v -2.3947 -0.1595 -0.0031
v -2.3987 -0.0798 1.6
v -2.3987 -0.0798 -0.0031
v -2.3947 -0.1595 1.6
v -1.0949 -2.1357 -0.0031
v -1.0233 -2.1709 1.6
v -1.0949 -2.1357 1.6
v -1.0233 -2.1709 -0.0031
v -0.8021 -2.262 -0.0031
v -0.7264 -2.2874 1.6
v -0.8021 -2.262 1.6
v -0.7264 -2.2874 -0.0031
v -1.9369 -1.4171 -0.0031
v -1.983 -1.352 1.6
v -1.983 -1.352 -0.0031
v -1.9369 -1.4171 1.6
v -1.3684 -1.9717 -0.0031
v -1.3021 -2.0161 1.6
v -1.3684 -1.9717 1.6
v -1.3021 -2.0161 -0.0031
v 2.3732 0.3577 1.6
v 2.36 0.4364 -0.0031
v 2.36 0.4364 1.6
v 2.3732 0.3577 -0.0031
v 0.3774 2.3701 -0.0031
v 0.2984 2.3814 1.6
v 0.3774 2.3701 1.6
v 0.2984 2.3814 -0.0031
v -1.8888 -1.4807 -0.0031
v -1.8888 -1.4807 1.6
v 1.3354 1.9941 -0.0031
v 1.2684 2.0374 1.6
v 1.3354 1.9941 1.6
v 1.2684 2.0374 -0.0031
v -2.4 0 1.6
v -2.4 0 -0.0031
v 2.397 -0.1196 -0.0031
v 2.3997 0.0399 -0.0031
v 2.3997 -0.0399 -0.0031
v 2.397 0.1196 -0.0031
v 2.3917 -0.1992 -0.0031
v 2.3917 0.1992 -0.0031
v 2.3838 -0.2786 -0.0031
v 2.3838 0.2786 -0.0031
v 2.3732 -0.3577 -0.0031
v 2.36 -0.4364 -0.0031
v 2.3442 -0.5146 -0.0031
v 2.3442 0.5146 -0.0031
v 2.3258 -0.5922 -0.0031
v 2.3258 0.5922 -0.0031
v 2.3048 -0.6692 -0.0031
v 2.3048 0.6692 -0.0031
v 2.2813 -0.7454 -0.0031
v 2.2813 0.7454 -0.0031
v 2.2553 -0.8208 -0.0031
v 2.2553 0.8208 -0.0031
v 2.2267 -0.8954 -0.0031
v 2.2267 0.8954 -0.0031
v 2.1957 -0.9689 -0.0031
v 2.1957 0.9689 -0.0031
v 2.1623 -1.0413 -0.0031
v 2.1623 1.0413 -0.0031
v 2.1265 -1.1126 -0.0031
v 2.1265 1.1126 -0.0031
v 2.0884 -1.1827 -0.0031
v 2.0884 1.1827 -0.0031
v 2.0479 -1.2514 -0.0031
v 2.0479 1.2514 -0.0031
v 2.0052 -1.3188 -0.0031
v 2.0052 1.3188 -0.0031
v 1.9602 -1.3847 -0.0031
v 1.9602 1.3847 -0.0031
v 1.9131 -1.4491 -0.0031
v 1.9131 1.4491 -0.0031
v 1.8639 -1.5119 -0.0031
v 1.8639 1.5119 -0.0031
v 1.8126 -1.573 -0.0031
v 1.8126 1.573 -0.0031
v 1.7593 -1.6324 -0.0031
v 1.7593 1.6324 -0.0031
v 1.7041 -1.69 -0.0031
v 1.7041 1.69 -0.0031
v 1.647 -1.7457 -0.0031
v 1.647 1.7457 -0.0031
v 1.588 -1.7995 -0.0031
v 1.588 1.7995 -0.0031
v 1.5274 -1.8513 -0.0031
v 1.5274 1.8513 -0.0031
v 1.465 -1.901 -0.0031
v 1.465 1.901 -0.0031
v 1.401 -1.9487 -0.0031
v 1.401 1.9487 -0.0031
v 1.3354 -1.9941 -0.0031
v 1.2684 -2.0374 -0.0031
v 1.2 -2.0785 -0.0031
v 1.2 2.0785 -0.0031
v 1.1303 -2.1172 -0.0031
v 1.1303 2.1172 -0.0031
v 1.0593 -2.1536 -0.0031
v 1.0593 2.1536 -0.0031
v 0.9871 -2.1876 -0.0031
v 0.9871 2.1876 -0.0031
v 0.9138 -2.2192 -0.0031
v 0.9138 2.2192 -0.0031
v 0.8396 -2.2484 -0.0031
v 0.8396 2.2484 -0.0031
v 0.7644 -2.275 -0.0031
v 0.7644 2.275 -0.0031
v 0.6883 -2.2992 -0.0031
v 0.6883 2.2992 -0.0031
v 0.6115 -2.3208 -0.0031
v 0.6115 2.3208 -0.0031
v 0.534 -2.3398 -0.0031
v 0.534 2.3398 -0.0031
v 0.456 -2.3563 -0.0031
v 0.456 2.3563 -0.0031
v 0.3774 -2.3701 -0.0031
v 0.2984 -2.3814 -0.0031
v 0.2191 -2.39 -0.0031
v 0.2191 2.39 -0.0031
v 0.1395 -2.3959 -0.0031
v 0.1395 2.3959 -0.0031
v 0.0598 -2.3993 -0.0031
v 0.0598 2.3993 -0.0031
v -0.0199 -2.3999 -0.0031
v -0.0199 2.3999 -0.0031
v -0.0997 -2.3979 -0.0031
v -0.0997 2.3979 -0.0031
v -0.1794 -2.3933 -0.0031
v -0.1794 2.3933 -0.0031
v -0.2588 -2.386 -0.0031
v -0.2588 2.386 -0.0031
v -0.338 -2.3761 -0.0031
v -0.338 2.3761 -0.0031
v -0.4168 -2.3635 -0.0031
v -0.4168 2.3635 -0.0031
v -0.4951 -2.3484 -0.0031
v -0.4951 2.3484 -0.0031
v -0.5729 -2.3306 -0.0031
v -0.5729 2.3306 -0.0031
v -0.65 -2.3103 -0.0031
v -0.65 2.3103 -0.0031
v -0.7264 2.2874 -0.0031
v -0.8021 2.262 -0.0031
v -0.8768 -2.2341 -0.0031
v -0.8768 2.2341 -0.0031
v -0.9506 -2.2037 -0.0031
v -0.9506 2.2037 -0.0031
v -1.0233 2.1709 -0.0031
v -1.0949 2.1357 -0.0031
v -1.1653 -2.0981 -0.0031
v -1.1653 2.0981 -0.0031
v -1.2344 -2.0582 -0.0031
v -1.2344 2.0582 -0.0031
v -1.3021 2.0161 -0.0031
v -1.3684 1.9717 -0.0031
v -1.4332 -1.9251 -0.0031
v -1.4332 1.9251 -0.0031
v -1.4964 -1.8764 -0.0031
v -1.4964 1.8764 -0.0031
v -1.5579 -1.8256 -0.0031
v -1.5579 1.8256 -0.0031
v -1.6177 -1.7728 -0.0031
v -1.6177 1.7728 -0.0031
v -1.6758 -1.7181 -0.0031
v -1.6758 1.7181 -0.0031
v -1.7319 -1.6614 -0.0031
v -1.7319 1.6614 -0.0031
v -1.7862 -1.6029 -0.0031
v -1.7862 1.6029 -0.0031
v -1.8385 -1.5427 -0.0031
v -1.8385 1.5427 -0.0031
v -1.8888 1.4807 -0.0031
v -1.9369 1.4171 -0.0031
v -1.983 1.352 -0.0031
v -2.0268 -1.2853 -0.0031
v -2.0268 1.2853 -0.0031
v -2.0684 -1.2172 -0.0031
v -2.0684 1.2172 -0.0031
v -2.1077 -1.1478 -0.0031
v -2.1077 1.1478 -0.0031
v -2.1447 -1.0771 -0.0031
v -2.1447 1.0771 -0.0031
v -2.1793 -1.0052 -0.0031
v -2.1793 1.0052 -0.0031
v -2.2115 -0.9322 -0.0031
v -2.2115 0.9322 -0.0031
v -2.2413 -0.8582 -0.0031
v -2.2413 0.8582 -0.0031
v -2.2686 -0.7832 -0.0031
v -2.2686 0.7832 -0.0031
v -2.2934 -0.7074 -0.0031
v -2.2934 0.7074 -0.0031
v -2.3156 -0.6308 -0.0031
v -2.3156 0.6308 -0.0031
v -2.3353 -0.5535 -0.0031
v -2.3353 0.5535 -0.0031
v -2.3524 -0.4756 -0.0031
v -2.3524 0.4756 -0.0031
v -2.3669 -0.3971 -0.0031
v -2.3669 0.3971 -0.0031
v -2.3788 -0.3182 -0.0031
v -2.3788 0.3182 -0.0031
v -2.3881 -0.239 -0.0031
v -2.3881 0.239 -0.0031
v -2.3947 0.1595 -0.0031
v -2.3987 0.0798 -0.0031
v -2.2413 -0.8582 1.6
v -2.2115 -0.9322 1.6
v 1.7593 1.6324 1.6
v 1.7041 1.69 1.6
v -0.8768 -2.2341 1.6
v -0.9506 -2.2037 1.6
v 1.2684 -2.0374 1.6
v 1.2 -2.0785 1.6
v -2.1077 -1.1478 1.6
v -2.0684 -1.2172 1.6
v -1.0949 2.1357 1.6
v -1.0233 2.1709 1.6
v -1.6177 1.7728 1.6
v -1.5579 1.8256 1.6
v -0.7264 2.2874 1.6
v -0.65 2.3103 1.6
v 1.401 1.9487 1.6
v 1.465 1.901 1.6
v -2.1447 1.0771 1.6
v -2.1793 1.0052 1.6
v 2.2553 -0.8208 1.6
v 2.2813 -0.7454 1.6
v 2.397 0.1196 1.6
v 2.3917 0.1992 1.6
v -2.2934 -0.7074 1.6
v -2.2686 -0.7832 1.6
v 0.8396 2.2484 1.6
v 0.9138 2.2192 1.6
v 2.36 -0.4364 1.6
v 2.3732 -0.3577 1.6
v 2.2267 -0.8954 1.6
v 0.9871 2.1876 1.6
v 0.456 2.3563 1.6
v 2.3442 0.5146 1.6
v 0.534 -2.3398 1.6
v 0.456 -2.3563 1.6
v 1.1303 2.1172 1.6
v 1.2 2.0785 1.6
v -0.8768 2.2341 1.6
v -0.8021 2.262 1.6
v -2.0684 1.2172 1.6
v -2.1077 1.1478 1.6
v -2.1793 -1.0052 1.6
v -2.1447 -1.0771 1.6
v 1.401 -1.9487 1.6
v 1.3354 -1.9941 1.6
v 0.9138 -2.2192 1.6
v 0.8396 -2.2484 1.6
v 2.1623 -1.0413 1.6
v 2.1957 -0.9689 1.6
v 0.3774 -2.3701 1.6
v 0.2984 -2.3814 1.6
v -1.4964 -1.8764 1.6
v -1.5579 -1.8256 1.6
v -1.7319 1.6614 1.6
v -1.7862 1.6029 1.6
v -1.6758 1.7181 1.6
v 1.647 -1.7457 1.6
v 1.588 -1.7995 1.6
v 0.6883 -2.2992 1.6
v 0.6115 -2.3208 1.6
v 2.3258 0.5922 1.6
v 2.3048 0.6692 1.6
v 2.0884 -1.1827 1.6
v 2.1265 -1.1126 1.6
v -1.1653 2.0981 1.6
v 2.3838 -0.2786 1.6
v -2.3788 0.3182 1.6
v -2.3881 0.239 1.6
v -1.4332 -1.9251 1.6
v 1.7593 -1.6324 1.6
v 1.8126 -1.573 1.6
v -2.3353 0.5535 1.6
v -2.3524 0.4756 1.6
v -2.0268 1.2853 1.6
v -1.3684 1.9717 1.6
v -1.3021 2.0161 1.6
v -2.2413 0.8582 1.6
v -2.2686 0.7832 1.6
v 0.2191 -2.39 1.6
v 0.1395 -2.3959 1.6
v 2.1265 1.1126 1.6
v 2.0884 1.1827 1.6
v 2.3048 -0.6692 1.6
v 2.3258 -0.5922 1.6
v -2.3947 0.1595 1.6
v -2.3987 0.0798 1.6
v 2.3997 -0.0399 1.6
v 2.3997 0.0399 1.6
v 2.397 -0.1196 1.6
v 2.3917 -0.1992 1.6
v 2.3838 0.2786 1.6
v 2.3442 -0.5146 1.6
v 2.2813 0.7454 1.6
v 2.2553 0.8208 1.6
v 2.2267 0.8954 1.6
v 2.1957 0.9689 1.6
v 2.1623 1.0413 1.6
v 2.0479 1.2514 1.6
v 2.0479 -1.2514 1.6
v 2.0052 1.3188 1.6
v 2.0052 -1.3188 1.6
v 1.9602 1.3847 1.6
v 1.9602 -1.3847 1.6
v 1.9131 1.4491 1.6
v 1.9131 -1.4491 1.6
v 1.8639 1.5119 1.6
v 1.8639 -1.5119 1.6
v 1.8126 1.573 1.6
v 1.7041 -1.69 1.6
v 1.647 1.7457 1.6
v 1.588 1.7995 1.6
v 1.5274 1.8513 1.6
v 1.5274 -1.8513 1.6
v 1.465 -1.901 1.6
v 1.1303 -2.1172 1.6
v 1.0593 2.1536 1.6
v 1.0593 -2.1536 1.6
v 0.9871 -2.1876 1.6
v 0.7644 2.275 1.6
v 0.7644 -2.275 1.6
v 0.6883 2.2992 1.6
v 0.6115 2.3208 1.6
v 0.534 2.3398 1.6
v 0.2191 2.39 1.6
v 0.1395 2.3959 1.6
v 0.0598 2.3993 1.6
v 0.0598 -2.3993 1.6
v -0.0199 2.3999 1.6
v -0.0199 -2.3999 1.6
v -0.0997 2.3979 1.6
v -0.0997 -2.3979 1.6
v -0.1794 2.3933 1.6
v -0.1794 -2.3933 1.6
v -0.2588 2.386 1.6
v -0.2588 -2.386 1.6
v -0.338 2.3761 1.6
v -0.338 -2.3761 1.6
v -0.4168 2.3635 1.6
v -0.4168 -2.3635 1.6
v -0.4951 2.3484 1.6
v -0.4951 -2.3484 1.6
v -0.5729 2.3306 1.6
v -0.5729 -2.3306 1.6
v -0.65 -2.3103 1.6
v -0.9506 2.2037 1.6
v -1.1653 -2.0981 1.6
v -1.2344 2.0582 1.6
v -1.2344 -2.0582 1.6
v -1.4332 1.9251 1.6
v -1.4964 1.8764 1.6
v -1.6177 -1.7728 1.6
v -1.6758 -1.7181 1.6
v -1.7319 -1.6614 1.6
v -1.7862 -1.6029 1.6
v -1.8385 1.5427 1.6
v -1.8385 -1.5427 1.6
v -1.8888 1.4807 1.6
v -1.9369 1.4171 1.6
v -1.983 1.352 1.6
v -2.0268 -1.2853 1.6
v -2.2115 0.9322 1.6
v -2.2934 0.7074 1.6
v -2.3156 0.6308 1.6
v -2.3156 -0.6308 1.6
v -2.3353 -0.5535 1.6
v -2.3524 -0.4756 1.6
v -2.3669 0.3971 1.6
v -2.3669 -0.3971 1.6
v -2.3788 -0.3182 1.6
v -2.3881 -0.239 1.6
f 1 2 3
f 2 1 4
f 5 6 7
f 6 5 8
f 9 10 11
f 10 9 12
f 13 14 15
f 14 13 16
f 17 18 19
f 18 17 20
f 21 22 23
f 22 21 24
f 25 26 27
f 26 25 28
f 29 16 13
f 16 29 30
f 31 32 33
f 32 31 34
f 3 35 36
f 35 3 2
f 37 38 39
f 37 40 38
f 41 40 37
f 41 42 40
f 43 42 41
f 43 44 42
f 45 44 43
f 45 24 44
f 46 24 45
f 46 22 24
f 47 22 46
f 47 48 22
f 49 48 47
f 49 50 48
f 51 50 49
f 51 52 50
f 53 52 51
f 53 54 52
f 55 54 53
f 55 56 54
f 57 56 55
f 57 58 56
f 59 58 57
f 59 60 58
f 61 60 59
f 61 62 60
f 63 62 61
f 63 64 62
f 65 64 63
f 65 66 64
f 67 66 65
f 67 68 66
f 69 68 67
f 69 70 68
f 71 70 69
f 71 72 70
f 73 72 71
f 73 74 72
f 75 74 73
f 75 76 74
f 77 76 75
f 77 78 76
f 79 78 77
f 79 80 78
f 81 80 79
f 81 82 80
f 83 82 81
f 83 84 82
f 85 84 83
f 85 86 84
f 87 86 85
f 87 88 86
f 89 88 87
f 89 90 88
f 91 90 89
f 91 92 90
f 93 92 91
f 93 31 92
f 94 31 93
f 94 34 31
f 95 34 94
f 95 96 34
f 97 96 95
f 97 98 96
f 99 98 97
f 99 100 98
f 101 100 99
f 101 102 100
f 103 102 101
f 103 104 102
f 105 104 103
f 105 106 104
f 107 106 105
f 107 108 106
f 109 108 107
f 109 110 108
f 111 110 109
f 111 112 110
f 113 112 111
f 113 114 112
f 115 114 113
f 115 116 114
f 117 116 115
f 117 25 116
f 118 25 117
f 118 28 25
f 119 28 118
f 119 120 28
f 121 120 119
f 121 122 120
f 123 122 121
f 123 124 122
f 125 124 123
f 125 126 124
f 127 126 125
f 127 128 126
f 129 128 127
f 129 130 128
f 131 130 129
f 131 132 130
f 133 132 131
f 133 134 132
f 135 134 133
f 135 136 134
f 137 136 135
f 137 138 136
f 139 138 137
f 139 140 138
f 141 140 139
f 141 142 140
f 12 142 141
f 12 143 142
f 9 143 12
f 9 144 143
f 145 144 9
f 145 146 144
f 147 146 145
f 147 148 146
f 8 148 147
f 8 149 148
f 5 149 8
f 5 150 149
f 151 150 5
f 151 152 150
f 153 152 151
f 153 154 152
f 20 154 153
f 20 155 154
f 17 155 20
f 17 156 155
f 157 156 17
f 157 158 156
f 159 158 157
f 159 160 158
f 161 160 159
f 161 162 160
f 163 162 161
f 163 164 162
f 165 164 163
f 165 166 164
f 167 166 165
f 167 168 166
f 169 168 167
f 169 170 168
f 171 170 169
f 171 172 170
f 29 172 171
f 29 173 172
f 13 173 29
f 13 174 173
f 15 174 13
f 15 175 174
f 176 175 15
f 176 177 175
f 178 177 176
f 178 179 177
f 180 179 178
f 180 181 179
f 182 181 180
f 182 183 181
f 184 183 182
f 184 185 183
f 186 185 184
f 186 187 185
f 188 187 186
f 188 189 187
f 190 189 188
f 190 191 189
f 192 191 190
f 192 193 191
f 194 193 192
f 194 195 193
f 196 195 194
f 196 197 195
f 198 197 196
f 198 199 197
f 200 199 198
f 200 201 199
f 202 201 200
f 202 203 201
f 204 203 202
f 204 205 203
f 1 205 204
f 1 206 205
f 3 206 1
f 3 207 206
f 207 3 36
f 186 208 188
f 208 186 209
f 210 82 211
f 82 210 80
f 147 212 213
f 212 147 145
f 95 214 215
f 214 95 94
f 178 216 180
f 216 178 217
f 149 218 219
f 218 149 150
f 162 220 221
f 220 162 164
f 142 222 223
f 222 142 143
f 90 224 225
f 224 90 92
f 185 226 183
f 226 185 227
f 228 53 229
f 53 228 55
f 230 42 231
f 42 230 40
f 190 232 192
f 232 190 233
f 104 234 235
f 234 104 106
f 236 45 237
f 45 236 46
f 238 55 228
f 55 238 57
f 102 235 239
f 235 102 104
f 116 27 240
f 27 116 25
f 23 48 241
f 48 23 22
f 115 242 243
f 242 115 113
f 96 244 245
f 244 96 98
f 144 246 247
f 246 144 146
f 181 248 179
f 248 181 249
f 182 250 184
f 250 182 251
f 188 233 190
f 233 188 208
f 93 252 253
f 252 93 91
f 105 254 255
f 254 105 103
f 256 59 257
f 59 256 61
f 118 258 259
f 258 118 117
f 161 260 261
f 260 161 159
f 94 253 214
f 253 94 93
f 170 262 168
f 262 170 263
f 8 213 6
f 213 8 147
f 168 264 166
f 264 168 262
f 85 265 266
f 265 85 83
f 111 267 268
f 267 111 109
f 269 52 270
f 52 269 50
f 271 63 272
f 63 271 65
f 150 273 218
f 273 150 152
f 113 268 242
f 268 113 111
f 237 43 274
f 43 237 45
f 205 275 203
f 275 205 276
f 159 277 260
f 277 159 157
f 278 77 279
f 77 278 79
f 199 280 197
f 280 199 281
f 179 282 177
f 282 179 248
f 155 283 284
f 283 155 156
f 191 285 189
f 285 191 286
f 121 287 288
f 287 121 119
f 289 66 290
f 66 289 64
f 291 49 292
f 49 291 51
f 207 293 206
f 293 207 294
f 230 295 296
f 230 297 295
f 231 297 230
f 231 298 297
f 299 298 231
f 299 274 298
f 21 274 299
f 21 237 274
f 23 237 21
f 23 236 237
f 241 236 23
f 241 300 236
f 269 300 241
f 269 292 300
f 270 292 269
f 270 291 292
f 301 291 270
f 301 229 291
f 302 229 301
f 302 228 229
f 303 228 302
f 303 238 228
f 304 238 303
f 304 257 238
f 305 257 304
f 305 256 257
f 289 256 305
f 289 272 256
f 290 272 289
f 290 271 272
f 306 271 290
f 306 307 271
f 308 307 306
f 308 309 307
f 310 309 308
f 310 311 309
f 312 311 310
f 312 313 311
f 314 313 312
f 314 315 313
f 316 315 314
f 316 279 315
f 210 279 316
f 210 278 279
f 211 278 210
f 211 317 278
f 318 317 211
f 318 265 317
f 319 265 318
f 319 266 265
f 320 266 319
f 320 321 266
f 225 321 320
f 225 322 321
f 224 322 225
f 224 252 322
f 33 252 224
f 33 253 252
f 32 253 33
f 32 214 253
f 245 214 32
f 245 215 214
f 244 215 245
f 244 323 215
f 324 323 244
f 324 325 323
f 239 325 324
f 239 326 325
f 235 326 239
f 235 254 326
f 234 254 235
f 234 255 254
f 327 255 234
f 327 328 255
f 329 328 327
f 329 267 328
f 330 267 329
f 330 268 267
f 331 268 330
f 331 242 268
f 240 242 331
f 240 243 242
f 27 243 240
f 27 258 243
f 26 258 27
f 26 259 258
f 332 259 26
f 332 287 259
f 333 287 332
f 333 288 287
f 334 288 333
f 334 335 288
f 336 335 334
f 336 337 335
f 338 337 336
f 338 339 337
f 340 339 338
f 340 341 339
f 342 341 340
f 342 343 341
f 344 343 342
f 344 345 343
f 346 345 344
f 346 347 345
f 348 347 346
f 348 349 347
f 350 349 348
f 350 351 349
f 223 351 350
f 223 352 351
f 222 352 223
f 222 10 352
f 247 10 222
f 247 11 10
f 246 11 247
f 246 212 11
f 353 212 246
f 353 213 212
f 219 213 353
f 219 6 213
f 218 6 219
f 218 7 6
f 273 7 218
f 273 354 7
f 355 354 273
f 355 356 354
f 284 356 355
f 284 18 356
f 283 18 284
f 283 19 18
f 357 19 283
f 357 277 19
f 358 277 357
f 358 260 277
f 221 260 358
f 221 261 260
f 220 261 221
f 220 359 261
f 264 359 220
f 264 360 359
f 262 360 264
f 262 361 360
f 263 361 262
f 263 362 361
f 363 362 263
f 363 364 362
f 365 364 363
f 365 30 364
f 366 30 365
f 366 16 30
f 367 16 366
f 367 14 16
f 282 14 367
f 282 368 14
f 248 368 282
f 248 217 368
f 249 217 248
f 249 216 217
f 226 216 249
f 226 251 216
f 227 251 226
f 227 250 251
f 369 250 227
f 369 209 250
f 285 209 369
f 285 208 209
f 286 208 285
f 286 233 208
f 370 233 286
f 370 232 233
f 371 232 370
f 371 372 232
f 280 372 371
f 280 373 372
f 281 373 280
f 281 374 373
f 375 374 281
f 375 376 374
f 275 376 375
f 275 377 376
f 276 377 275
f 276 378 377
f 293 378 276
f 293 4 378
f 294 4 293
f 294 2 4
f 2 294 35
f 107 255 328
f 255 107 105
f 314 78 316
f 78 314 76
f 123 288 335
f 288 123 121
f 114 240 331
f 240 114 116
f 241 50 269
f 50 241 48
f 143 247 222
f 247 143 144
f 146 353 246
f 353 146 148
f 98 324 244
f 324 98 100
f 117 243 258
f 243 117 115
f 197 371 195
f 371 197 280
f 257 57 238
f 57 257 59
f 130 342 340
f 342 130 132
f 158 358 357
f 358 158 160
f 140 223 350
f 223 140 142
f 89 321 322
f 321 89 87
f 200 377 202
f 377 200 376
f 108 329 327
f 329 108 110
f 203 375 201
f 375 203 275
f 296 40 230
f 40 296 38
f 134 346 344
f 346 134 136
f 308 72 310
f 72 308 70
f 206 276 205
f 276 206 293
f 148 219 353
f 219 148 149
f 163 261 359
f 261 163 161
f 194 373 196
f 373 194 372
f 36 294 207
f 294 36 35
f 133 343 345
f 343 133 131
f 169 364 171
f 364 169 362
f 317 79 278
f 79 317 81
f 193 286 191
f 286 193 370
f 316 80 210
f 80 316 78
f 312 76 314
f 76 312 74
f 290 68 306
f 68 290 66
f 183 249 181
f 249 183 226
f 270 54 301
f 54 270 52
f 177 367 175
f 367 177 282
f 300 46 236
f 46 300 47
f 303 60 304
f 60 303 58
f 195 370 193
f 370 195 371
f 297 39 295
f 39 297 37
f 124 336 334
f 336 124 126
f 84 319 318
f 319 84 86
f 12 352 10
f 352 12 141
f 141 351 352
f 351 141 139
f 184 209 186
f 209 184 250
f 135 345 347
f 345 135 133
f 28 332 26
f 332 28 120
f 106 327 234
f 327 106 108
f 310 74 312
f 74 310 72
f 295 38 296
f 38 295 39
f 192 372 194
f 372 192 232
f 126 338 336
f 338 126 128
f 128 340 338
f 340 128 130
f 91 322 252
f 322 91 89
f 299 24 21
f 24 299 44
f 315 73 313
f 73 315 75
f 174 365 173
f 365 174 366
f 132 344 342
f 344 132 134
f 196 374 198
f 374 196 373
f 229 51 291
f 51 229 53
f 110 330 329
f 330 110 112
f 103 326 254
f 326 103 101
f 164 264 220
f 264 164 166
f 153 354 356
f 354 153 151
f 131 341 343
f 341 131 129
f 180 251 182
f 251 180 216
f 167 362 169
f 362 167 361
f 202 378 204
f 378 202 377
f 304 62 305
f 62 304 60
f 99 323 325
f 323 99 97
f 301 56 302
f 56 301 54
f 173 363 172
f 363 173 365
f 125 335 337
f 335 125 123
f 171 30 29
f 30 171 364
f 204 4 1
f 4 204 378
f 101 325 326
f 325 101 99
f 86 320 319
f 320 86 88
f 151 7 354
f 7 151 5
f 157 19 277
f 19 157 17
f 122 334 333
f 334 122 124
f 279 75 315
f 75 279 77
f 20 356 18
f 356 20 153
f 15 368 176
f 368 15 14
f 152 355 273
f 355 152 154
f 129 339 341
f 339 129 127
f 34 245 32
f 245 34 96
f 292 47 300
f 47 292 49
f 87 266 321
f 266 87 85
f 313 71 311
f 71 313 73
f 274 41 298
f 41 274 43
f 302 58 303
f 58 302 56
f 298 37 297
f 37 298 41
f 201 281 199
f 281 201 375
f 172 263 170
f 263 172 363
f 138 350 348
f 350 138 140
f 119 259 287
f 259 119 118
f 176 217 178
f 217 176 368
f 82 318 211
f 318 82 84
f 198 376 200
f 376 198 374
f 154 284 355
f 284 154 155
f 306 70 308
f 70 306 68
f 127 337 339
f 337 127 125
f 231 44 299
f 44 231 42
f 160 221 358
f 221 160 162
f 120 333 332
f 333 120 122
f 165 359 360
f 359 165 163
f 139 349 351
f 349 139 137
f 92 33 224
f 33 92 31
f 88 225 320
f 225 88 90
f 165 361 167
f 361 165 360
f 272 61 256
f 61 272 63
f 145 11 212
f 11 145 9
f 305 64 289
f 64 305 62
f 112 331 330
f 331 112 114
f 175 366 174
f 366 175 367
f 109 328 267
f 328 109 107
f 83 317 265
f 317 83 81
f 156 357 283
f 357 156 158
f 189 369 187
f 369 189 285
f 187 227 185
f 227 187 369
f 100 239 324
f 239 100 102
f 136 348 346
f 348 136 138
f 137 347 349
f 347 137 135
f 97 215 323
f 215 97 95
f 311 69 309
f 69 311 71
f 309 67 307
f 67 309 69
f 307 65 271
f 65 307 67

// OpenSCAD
// file: ../p/4-4edge.scad
use <../lib.scad>
$fa=1; $fs=0.2;
function ldraw_lib__4_4edge(realsolid=false) = [
// 0 Circle 1.0
// 0 Name: 4-4edge.dat
// 0 Author: James Jessiman
// 0 !LDRAW_ORG Primitive UPDATE 2017-01
// 0 !LICENSE Licensed under CC BY 2.0 and CC BY 4.0 : see CAreadme.txt
// 
// 0 BFC CERTIFY CCW
  [0,"BFC","CERTIFY"],
  [0,"BFC","CCW"],
// 
// 0 !HISTORY 1998-12-15 [PTadmin] Official Update 1998-10
// 0 !HISTORY 2005-12-28 [PTadmin] Official Update 2005-01
// 0 !HISTORY 2007-06-24 [PTadmin] Header formatted for Contributor Agreement
// 0 !HISTORY 2008-07-01 [PTadmin] Official Update 2008-01
// 0 !HISTORY 2017-01-15 [Steffen] BFCed
// 0 !HISTORY 2017-12-30 [PTadmin] Official Update 2017-01
// 
// 
// 2 24 1 0 0 0.9239 0 0.3827
  [2,24,1,0,0,0.9239,0,0.3827],
// 2 24 0.9239 0 0.3827 0.7071 0 0.7071
  [2,24,0.9239,0,0.3827,0.7071,0,0.7071],
// 2 24 0.7071 0 0.7071 0.3827 0 0.9239
  [2,24,0.7071,0,0.7071,0.3827,0,0.9239],
// 2 24 0.3827 0 0.9239 0 0 1
  [2,24,0.3827,0,0.9239,0,0,1],
// 2 24 0 0 1 -0.3827 0 0.9239
  [2,24,0,0,1,-0.3827,0,0.9239],
// 2 24 -0.3827 0 0.9239 -0.7071 0 0.7071
  [2,24,-0.3827,0,0.9239,-0.7071,0,0.7071],
// 2 24 -0.7071 0 0.7071 -0.9239 0 0.3827
  [2,24,-0.7071,0,0.7071,-0.9239,0,0.3827],
// 2 24 -0.9239 0 0.3827 -1 0 -0
  [2,24,-0.9239,0,0.3827,-1,0,-0],
// 2 24 -1 0 -0 -0.9239 0 -0.3827
  [2,24,-1,0,-0,-0.9239,0,-0.3827],
// 2 24 -0.9239 0 -0.3827 -0.7071 0 -0.7071
  [2,24,-0.9239,0,-0.3827,-0.7071,0,-0.7071],
// 2 24 -0.7071 0 -0.7071 -0.3827 0 -0.9239
  [2,24,-0.7071,0,-0.7071,-0.3827,0,-0.9239],
// 2 24 -0.3827 0 -0.9239 0 0 -1
  [2,24,-0.3827,0,-0.9239,0,0,-1],
// 2 24 0 0 -1 0.3827 0 -0.9239
  [2,24,0,0,-1,0.3827,0,-0.9239],
// 2 24 0.3827 0 -0.9239 0.7071 0 -0.7071
  [2,24,0.3827,0,-0.9239,0.7071,0,-0.7071],
// 2 24 0.7071 0 -0.7071 0.9239 0 -0.3827
  [2,24,0.7071,0,-0.7071,0.9239,0,-0.3827],
// 2 24 0.9239 0 -0.3827 1 0 0
  [2,24,0.9239,0,-0.3827,1,0,0],
];
module ldraw_lib__4_4edge(step=0, col=false, unit=2/5, alt=false, line=0.2, solid=!$preview)
    makepoly(ldraw_lib__4_4edge(solid), step=step, col=col, unit=unit, alt=alt, line=line, solid=solid);
ldraw_lib__4_4edge(line=0.2);
// file: ../p/4-4disc.scad
use <../lib.scad>
$fa=1; $fs=0.2;
function ldraw_lib__4_4disc(realsolid=false) = [
// 0 Disc 1.0
// 0 Name: 4-4disc.dat
// 0 Author: James Jessiman
// 0 !LDRAW_ORG Primitive UPDATE 2002-02
// 0 !LICENSE Licensed under CC BY 2.0 and CC BY 4.0 : see CAreadme.txt
// 
// 0 BFC CERTIFY CCW
  [0,"BFC","CERTIFY"],
  [0,"BFC","CCW"],
// 
// 0 !HISTORY 1998-12-15 [PTadmin] Official Update 1998-10
// 0 !HISTORY 2002-03-23 [sbliss] Added BFC statement
// 0 !HISTORY 2002-04-25 [PTadmin] Official Update 2002-02
// 0 !HISTORY 2007-06-24 [PTadmin] Header formatted for Contributor Agreement
// 0 !HISTORY 2008-07-01 [PTadmin] Official Update 2008-01
// 
// 
// 3 16 0 0 0 1 0 0 0.9239 0 0.3827
  [3,16,0,0,0,1,0,0,0.9239,0,0.3827],
// 3 16 0 0 0 0.9239 0 0.3827 0.7071 0 0.7071
  [3,16,0,0,0,0.9239,0,0.3827,0.7071,0,0.7071],
// 3 16 0 0 0 0.7071 0 0.7071 0.3827 0 0.9239
  [3,16,0,0,0,0.7071,0,0.7071,0.3827,0,0.9239],
// 3 16 0 0 0 0.3827 0 0.9239 0 0 1
  [3,16,0,0,0,0.3827,0,0.9239,0,0,1],
// 3 16 0 0 0 0 0 1 -0.3827 0 0.9239
  [3,16,0,0,0,0,0,1,-0.3827,0,0.9239],
// 3 16 0 0 0 -0.3827 0 0.9239 -0.7071 0 0.7071
  [3,16,0,0,0,-0.3827,0,0.9239,-0.7071,0,0.7071],
// 3 16 0 0 0 -0.7071 0 0.7071 -0.9239 0 0.3827
  [3,16,0,0,0,-0.7071,0,0.7071,-0.9239,0,0.3827],
// 3 16 0 0 0 -0.9239 0 0.3827 -1 0 -0
  [3,16,0,0,0,-0.9239,0,0.3827,-1,0,-0],
// 3 16 0 0 0 -1 0 -0 -0.9239 0 -0.3827
  [3,16,0,0,0,-1,0,-0,-0.9239,0,-0.3827],
// 3 16 0 0 0 -0.9239 0 -0.3827 -0.7071 0 -0.7071
  [3,16,0,0,0,-0.9239,0,-0.3827,-0.7071,0,-0.7071],
// 3 16 0 0 0 -0.7071 0 -0.7071 -0.3827 0 -0.9239
  [3,16,0,0,0,-0.7071,0,-0.7071,-0.3827,0,-0.9239],
// 3 16 0 0 0 -0.3827 0 -0.9239 0 0 -1
  [3,16,0,0,0,-0.3827,0,-0.9239,0,0,-1],
// 3 16 0 0 0 0 0 -1 0.3827 0 -0.9239
  [3,16,0,0,0,0,0,-1,0.3827,0,-0.9239],
// 3 16 0 0 0 0.3827 0 -0.9239 0.7071 0 -0.7071
  [3,16,0,0,0,0.3827,0,-0.9239,0.7071,0,-0.7071],
// 3 16 0 0 0 0.7071 0 -0.7071 0.9239 0 -0.3827
  [3,16,0,0,0,0.7071,0,-0.7071,0.9239,0,-0.3827],
// 3 16 0 0 0 0.9239 0 -0.3827 1 0 0
  [3,16,0,0,0,0.9239,0,-0.3827,1,0,0],
// 0
];
module ldraw_lib__4_4disc(step=0, col=false, unit=2/5, alt=false, line=0.2, solid=!$preview)
    makepoly(ldraw_lib__4_4disc(solid), step=step, col=col, unit=unit, alt=alt, line=line, solid=solid);
ldraw_lib__4_4disc(line=0.2);
// file: ../p/4-4cyli.scad
use <../lib.scad>
$fa=1; $fs=0.2;
function ldraw_lib__4_4cyli(realsolid=false) = [
// 0 Cylinder 1.0
// 0 Name: 4-4cyli.dat
// 0 Author: James Jessiman
// 0 !LDRAW_ORG Primitive UPDATE 2005-01
// 0 !LICENSE Licensed under CC BY 2.0 and CC BY 4.0 : see CAreadme.txt
// 
// 0 BFC CERTIFY CCW
  [0,"BFC","CERTIFY"],
  [0,"BFC","CCW"],
// 
// 0 !HISTORY 1998-12-15 [PTadmin] Official Update 1998-10
// 0 !HISTORY 2002-03-23 [sbliss] Added BFC statement; merged headers from files in distributions LDraw 0.27 and Complete.
// 0 !HISTORY 2002-04-25 [PTadmin] Official Update 2002-02
// 0 !HISTORY 2004-12-14 [guyvivan] BFC CCW
// 0 !HISTORY 2005-12-28 [PTadmin] Official Update 2005-01
// 0 !HISTORY 2007-06-24 [PTadmin] Header formatted for Contributor Agreement
// 0 !HISTORY 2008-07-01 [PTadmin] Official Update 2008-01
// 
// 
// 4 16 1 1 0 0.9239 1 0.3827 0.9239 0 0.3827 1 0 0
  [4,16,1,1,0,0.9239,1,0.3827,0.9239,0,0.3827,1,0,0],
// 5 24 1 0 0 1 1 0 0.9239 0 0.3827 0.9239 0 -0.3827
  [5,24,1,0,0,1,1,0,0.9239,0,0.3827,0.9239,0,-0.3827],
// 4 16 0.9239 1 0.3827 0.7071 1 0.7071 0.7071 0 0.7071 0.9239 0 0.3827
  [4,16,0.9239,1,0.3827,0.7071,1,0.7071,0.7071,0,0.7071,0.9239,0,0.3827],
// 5 24 0.9239 0 0.3827 0.9239 1 0.3827 0.7071 0 0.7071 1 0 0
  [5,24,0.9239,0,0.3827,0.9239,1,0.3827,0.7071,0,0.7071,1,0,0],
// 4 16 0.7071 1 0.7071 0.3827 1 0.9239 0.3827 0 0.9239 0.7071 0 0.7071
  [4,16,0.7071,1,0.7071,0.3827,1,0.9239,0.3827,0,0.9239,0.7071,0,0.7071],
// 5 24 0.7071 0 0.7071 0.7071 1 0.7071 0.3827 0 0.9239 0.9239 0 0.3827
  [5,24,0.7071,0,0.7071,0.7071,1,0.7071,0.3827,0,0.9239,0.9239,0,0.3827],
// 4 16 0.3827 1 0.9239 0 1 1 0 0 1 0.3827 0 0.9239
  [4,16,0.3827,1,0.9239,0,1,1,0,0,1,0.3827,0,0.9239],
// 5 24 0.3827 0 0.9239 0.3827 1 0.9239 0 0 1 0.7071 0 0.7071
  [5,24,0.3827,0,0.9239,0.3827,1,0.9239,0,0,1,0.7071,0,0.7071],
// 4 16 0 1 1 -0.3827 1 0.9239 -0.3827 0 0.9239 0 0 1
  [4,16,0,1,1,-0.3827,1,0.9239,-0.3827,0,0.9239,0,0,1],
// 5 24 0 0 1 0 1 1 -0.3827 0 0.9239 0.3827 0 0.9239
  [5,24,0,0,1,0,1,1,-0.3827,0,0.9239,0.3827,0,0.9239],
// 4 16 -0.3827 1 0.9239 -0.7071 1 0.7071 -0.7071 0 0.7071 -0.3827 0 0.9239
  [4,16,-0.3827,1,0.9239,-0.7071,1,0.7071,-0.7071,0,0.7071,-0.3827,0,0.9239],
// 5 24 -0.3827 0 0.9239 -0.3827 1 0.9239 -0.7071 0 0.7071 0 0 1
  [5,24,-0.3827,0,0.9239,-0.3827,1,0.9239,-0.7071,0,0.7071,0,0,1],
// 4 16 -0.7071 1 0.7071 -0.9239 1 0.3827 -0.9239 0 0.3827 -0.7071 0 0.7071
  [4,16,-0.7071,1,0.7071,-0.9239,1,0.3827,-0.9239,0,0.3827,-0.7071,0,0.7071],
// 5 24 -0.7071 0 0.7071 -0.7071 1 0.7071 -0.9239 0 0.3827 -0.3827 0 0.9239
  [5,24,-0.7071,0,0.7071,-0.7071,1,0.7071,-0.9239,0,0.3827,-0.3827,0,0.9239],
// 4 16 -0.9239 1 0.3827 -1 1 0 -1 0 0 -0.9239 0 0.3827
  [4,16,-0.9239,1,0.3827,-1,1,0,-1,0,0,-0.9239,0,0.3827],
// 5 24 -0.9239 0 0.3827 -0.9239 1 0.3827 -1 0 0 -0.7071 0 0.7071
  [5,24,-0.9239,0,0.3827,-0.9239,1,0.3827,-1,0,0,-0.7071,0,0.7071],
// 4 16 -1 1 0 -0.9239 1 -0.3827 -0.9239 0 -0.3827 -1 0 0
  [4,16,-1,1,0,-0.9239,1,-0.3827,-0.9239,0,-0.3827,-1,0,0],
// 5 24 -1 0 0 -1 1 0 -0.9239 0 -0.3827 -0.9239 0 0.3827
  [5,24,-1,0,0,-1,1,0,-0.9239,0,-0.3827,-0.9239,0,0.3827],
// 4 16 -0.9239 1 -0.3827 -0.7071 1 -0.7071 -0.7071 0 -0.7071 -0.9239 0 -0.3827
  [4,16,-0.9239,1,-0.3827,-0.7071,1,-0.7071,-0.7071,0,-0.7071,-0.9239,0,-0.3827],
// 5 24 -0.9239 0 -0.3827 -0.9239 1 -0.3827 -0.7071 0 -0.7071 -1 0 0
  [5,24,-0.9239,0,-0.3827,-0.9239,1,-0.3827,-0.7071,0,-0.7071,-1,0,0],
// 4 16 -0.7071 1 -0.7071 -0.3827 1 -0.9239 -0.3827 0 -0.9239 -0.7071 0 -0.7071
  [4,16,-0.7071,1,-0.7071,-0.3827,1,-0.9239,-0.3827,0,-0.9239,-0.7071,0,-0.7071],
// 5 24 -0.7071 0 -0.7071 -0.7071 1 -0.7071 -0.3827 0 -0.9239 -0.9239 0 -0.3827
  [5,24,-0.7071,0,-0.7071,-0.7071,1,-0.7071,-0.3827,0,-0.9239,-0.9239,0,-0.3827],
// 4 16 -0.3827 1 -0.9239 0 1 -1 0 0 -1 -0.3827 0 -0.9239
  [4,16,-0.3827,1,-0.9239,0,1,-1,0,0,-1,-0.3827,0,-0.9239],
// 5 24 -0.3827 0 -0.9239 -0.3827 1 -0.9239 0 0 -1 -0.7071 0 -0.7071
  [5,24,-0.3827,0,-0.9239,-0.3827,1,-0.9239,0,0,-1,-0.7071,0,-0.7071],
// 4 16 0 1 -1 0.3827 1 -0.9239 0.3827 0 -0.9239 0 0 -1
  [4,16,0,1,-1,0.3827,1,-0.9239,0.3827,0,-0.9239,0,0,-1],
// 5 24 0 0 -1 0 1 -1 0.3827 0 -0.9239 -0.3827 0 -0.9239
  [5,24,0,0,-1,0,1,-1,0.3827,0,-0.9239,-0.3827,0,-0.9239],
// 4 16 0.3827 1 -0.9239 0.7071 1 -0.7071 0.7071 0 -0.7071 0.3827 0 -0.9239
  [4,16,0.3827,1,-0.9239,0.7071,1,-0.7071,0.7071,0,-0.7071,0.3827,0,-0.9239],
// 5 24 0.3827 0 -0.9239 0.3827 1 -0.9239 0.7071 0 -0.7071 0 0 -1
  [5,24,0.3827,0,-0.9239,0.3827,1,-0.9239,0.7071,0,-0.7071,0,0,-1],
// 4 16 0.7071 1 -0.7071 0.9239 1 -0.3827 0.9239 0 -0.3827 0.7071 0 -0.7071
  [4,16,0.7071,1,-0.7071,0.9239,1,-0.3827,0.9239,0,-0.3827,0.7071,0,-0.7071],
// 5 24 0.7071 0 -0.7071 0.7071 1 -0.7071 0.9239 0 -0.3827 0.3827 0 -0.9239
  [5,24,0.7071,0,-0.7071,0.7071,1,-0.7071,0.9239,0,-0.3827,0.3827,0,-0.9239],
// 4 16 0.9239 1 -0.3827 1 1 0 1 0 0 0.9239 0 -0.3827
  [4,16,0.9239,1,-0.3827,1,1,0,1,0,0,0.9239,0,-0.3827],
// 5 24 0.9239 0 -0.3827 0.9239 1 -0.3827 1 0 0 0.7071 0 -0.7071
  [5,24,0.9239,0,-0.3827,0.9239,1,-0.3827,1,0,0,0.7071,0,-0.7071],
// 0
];
module ldraw_lib__4_4cyli(step=0, col=false, unit=2/5, alt=false, line=0.2, solid=!$preview)
    makepoly(ldraw_lib__4_4cyli(solid), step=step, col=col, unit=unit, alt=alt, line=line, solid=solid);
ldraw_lib__4_4cyli(line=0.2);
// file: ../p/stud3.scad
use <../lib.scad>
use <4-4cyli.scad>
use <4-4disc.scad>
use <4-4edge.scad>
$fa=1; $fs=0.2;
function ldraw_lib__stud3(realsolid=false) = realsolid ? 
    [openscad(translate([0,0,-eps()], o=cylinder(4+eps(), r=4)),2)] : [
// 0 Stud Tube Solid
// 0 Name: stud3.dat
// 0 Author: James Jessiman
// 0 !LDRAW_ORG Primitive UPDATE 2012-01
// 0 !LICENSE Licensed under CC BY 2.0 and CC BY 4.0 : see CAreadme.txt
// 
// 0 BFC CERTIFY CCW
  [0,"BFC","CERTIFY"],
  [0,"BFC","CCW"],
// 
// 0 !HISTORY 2002-04-04 [sbliss] Modified for BFC compliance
// 0 !HISTORY 2002-04-25 [PTadmin] Official Update 2002-02
// 0 !HISTORY 2007-06-24 [PTadmin] Header formatted for Contributor Agreement
// 0 !HISTORY 2008-07-01 [PTadmin] Official Update 2008-01
// 0 !HISTORY 2012-02-16 [Philo] Changed to CCW
// 0 !HISTORY 2012-03-30 [PTadmin] Official Update 2012-01
// 
// 
// 1 16 0 -4 0 4 0 0 0 1 0 0 0 4 4-4edge.dat
  [1,16,0,-4,0,4,0,0,0,1,0,0,0,4, ldraw_lib__4_4edge(realsolid)],
// 1 16 0 0 0 4 0 0 0 1 0 0 0 4 4-4edge.dat
  [1,16,0,0,0,4,0,0,0,1,0,0,0,4, ldraw_lib__4_4edge(realsolid)],
// 1 16 0 -4 0 4 0 0 0 1 0 0 0 4 4-4disc.dat
  [1,16,0,-4,0,4,0,0,0,1,0,0,0,4, ldraw_lib__4_4disc(realsolid)],
// 1 16 0 -4 0 4 0 0 0 4 0 0 0 4 4-4cyli.dat
  [1,16,0,-4,0,4,0,0,0,4,0,0,0,4, ldraw_lib__4_4cyli(realsolid)],
];
module ldraw_lib__stud3(step=0, col=false, unit=2/5, alt=false, line=0.2, solid=!$preview)
    makepoly(ldraw_lib__stud3(solid), step=step, col=col, unit=unit, alt=alt, line=line, solid=solid);
ldraw_lib__stud3(line=0.2);
// file: ../p/stud.scad
use <../lib.scad>
use <4-4cyli.scad>
use <4-4disc.scad>
use <4-4edge.scad>
$fa=1; $fs=0.2;
function ldraw_lib__stud(realsolid=false) = realsolid ? 
    [openscad(translate([0,0,-eps()], o=cylinder(4+eps(), r=6)),2)] : [
// 0 Stud
// 0 Name: stud.dat
// 0 Author: James Jessiman
// 0 !LDRAW_ORG Primitive UPDATE 2012-01
// 0 !LICENSE Licensed under CC BY 2.0 and CC BY 4.0 : see CAreadme.txt
// 
// 0 BFC CERTIFY CCW
  [0,"BFC","CERTIFY"],
  [0,"BFC","CCW"],
// 
// 0 !HISTORY 2002-04-04 [sbliss] Modified for BFC compliance
// 0 !HISTORY 2002-04-25 [PTadmin] Official Update 2002-02
// 0 !HISTORY 2007-06-24 [PTadmin] Header formatted for Contributor Agreement
// 0 !HISTORY 2008-07-01 [PTadmin] Official Update 2008-01
// 0 !HISTORY 2012-02-16 [Philo] Changed to CCW
// 0 !HISTORY 2012-03-30 [PTadmin] Official Update 2012-01
// 
// 
// 1 16 0 0 0 6 0 0 0 1 0 0 0 6 4-4edge.dat
  [1,16,0,0,0,6,0,0,0,1,0,0,0,6, ldraw_lib__4_4edge(realsolid)],
// 1 16 0 -4 0 6 0 0 0 1 0 0 0 6 4-4edge.dat
  [1,16,0,-4,0,6,0,0,0,1,0,0,0,6, ldraw_lib__4_4edge(realsolid)],
// 1 16 0 0 0 6 0 0 0 -4 0 0 0 6 4-4cyli.dat
  [1,16,0,0,0,6,0,0,0,-4,0,0,0,6, ldraw_lib__4_4cyli(realsolid)],
// 1 16 0 -4 0 6 0 0 0 1 0 0 0 6 4-4disc.dat
  [1,16,0,-4,0,6,0,0,0,1,0,0,0,6, ldraw_lib__4_4disc(realsolid)],
];
module ldraw_lib__stud(step=0, col=false, unit=2/5, alt=false, line=0.2, solid=!$preview)
    makepoly(ldraw_lib__stud(solid), step=step, col=col, unit=unit, alt=alt, line=line, solid=solid);
ldraw_lib__stud(line=0.2);
// file: ../p/box5.scad
use <../lib.scad>
$fa=1; $fs=0.2;
function ldraw_lib__box5(realsolid=false) = [
// 0 Box with 5 Faces and All Edges
// 0 Name: box5.dat
// 0 Author: James Jessiman
// 0 !LDRAW_ORG Primitive UPDATE 2012-01
// 0 !LICENSE Licensed under CC BY 2.0 and CC BY 4.0 : see CAreadme.txt
// 
// 0 BFC CERTIFY CCW
  [0,"BFC","CERTIFY"],
  [0,"BFC","CCW"],
// 
// 0 !HISTORY 2002-04-03 [sbliss] Modified for BFC compliance
// 0 !HISTORY 2002-04-25 [PTadmin] Official Update 2002-02
// 0 !HISTORY 2007-06-24 [PTadmin] Header formatted for Contributor Agreement
// 0 !HISTORY 2008-07-01 [PTadmin] Official Update 2008-01
// 0 !HISTORY 2012-02-16 [Philo] Changed to CCW
// 0 !HISTORY 2012-03-30 [PTadmin] Official Update 2012-01
// 
// 
// 2 24 1 1 1 -1 1 1
  [2,24,1,1,1,-1,1,1],
// 2 24 -1 1 1 -1 1 -1
  [2,24,-1,1,1,-1,1,-1],
// 2 24 -1 1 -1 1 1 -1
  [2,24,-1,1,-1,1,1,-1],
// 2 24 1 1 -1 1 1 1
  [2,24,1,1,-1,1,1,1],
// 2 24 1 0 1 -1 0 1
  [2,24,1,0,1,-1,0,1],
// 2 24 -1 0 1 -1 0 -1
  [2,24,-1,0,1,-1,0,-1],
// 2 24 -1 0 -1 1 0 -1
  [2,24,-1,0,-1,1,0,-1],
// 2 24 1 0 -1 1 0 1
  [2,24,1,0,-1,1,0,1],
// 2 24 1 0 1 1 1 1
  [2,24,1,0,1,1,1,1],
// 2 24 -1 0 1 -1 1 1
  [2,24,-1,0,1,-1,1,1],
// 2 24 1 0 -1 1 1 -1
  [2,24,1,0,-1,1,1,-1],
// 2 24 -1 0 -1 -1 1 -1
  [2,24,-1,0,-1,-1,1,-1],
// 4 16 -1 1 1 1 1 1 1 1 -1 -1 1 -1
  [4,16,-1,1,1,1,1,1,1,1,-1,-1,1,-1],
// 4 16 -1 1 1 -1 0 1 1 0 1 1 1 1
  [4,16,-1,1,1,-1,0,1,1,0,1,1,1,1],
// 4 16 -1 1 -1 -1 0 -1 -1 0 1 -1 1 1
  [4,16,-1,1,-1,-1,0,-1,-1,0,1,-1,1,1],
// 4 16 1 1 -1 1 0 -1 -1 0 -1 -1 1 -1
  [4,16,1,1,-1,1,0,-1,-1,0,-1,-1,1,-1],
// 4 16 1 1 1 1 0 1 1 0 -1 1 1 -1
  [4,16,1,1,1,1,0,1,1,0,-1,1,1,-1],
];
module ldraw_lib__box5(step=0, col=false, unit=2/5, alt=false, line=0.2, solid=!$preview)
    makepoly(ldraw_lib__box5(solid), step=step, col=col, unit=unit, alt=alt, line=line, solid=solid);
ldraw_lib__box5(line=0.2);
// file: ../p/box4t.scad
use <../lib.scad>
$fa=1; $fs=0.2;
function ldraw_lib__box4t(realsolid=false) = [
// 0 Box with 4 Adjacent Faces and All Edges
// 0 Name: box4t.dat
// 0 Author: Tore Eriksson [Tore_Eriksson]
// 0 !LDRAW_ORG Primitive UPDATE 2003-02
// 0 !LICENSE Licensed under CC BY 2.0 and CC BY 4.0 : see CAreadme.txt
// 
// 0 BFC CERTIFY CCW
  [0,"BFC","CERTIFY"],
  [0,"BFC","CCW"],
// 
// 0 !HISTORY 1997-09-29 [PTadmin] Official Update 1997-15
// 0 !HISTORY 2002-08-31 [izanette] Modified with WINDZ for BFC compliance
// 0 !HISTORY 2003-08-01 [PTadmin] Official Update 2003-02
// 0 !HISTORY 2007-06-24 [PTadmin] Header formatted for Contributor Agreement
// 0 !HISTORY 2008-07-01 [PTadmin] Official Update 2008-01
// 
// 
// 2 24 1 1 1 -1 1 1
  [2,24,1,1,1,-1,1,1],
// 2 24 -1 1 1 -1 1 -1
  [2,24,-1,1,1,-1,1,-1],
// 2 24 -1 1 -1 1 1 -1
  [2,24,-1,1,-1,1,1,-1],
// 2 24 1 1 -1 1 1 1
  [2,24,1,1,-1,1,1,1],
// 2 24 1 0 1 -1 0 1
  [2,24,1,0,1,-1,0,1],
// 2 24 -1 0 1 -1 0 -1
  [2,24,-1,0,1,-1,0,-1],
// 2 24 -1 0 -1 1 0 -1
  [2,24,-1,0,-1,1,0,-1],
// 2 24 1 0 -1 1 0 1
  [2,24,1,0,-1,1,0,1],
// 2 24 1 0 1 1 1 1
  [2,24,1,0,1,1,1,1],
// 2 24 -1 0 1 -1 1 1
  [2,24,-1,0,1,-1,1,1],
// 2 24 1 0 -1 1 1 -1
  [2,24,1,0,-1,1,1,-1],
// 2 24 -1 0 -1 -1 1 -1
  [2,24,-1,0,-1,-1,1,-1],
// 4 16 1 1 1 1 1 -1 -1 1 -1 -1 1 1
  [4,16,1,1,1,1,1,-1,-1,1,-1,-1,1,1],
// 4 16 1 1 1 -1 1 1 -1 0 1 1 0 1
  [4,16,1,1,1,-1,1,1,-1,0,1,1,0,1],
// 4 16 -1 1 1 -1 1 -1 -1 0 -1 -1 0 1
  [4,16,-1,1,1,-1,1,-1,-1,0,-1,-1,0,1],
// 0 4 16 -1 1 -1 -1 0 -1 1 0 -1 1 1 -1
// 4 16 1 1 -1 1 1 1 1 0 1 1 0 -1
  [4,16,1,1,-1,1,1,1,1,0,1,1,0,-1],
// 0
];
module ldraw_lib__box4t(step=0, col=false, unit=2/5, alt=false, line=0.2, solid=!$preview)
    makepoly(ldraw_lib__box4t(solid), step=step, col=col, unit=unit, alt=alt, line=line, solid=solid);
ldraw_lib__box4t(line=0.2);
// file: s/3004s01.scad
use <../../lib.scad>
use <../../p/box4t.scad>
use <../../p/box5.scad>
use <../../p/stud.scad>
use <../../p/stud3.scad>
$fa=1; $fs=0.2;
function ldraw_lib__s__3004s01(realsolid=false) = [
// 0 ~Brick  1 x  2 without Front Face
// 0 Name: s\3004s01.dat
// 0 Author: James Jessiman
// 0 !LDRAW_ORG Subpart UPDATE 2003-03
// 0 !LICENSE Licensed under CC BY 2.0 and CC BY 4.0 : see CAreadme.txt
// 
// 0 BFC CERTIFY CCW
  [0,"BFC","CERTIFY"],
  [0,"BFC","CCW"],
// 
// 0 !HISTORY 2003-09-07 [jriley] Subfiling, BFC
// 0 !HISTORY 2003-12-19 [PTadmin] Official Update 2003-03
// 0 !HISTORY 2007-08-29 [PTadmin] Header formatted for Contributor Agreement
// 0 !HISTORY 2008-07-01 [PTadmin] Official Update 2008-01
// 
// 
// 1 16 0 4 0 1 0 0 0 -5 0 0 0 1 stud3.dat
  [1,16,0,4,0,1,0,0,0,-5,0,0,0,1, ldraw_lib__stud3(realsolid)],
// 0 BFC INVERTNEXT
  [0,"BFC","INVERTNEXT"],
// 1 16 0 24 0 16 0 0 0 -20 0 0 0 6 box5.dat
  [1,16,0,24,0,16,0,0,0,-20,0,0,0,6, ldraw_lib__box5(realsolid)],
// 4 16 20 24 10 16 24 6 -16 24 6 -20 24 10
  [4,16,20,24,10,16,24,6,-16,24,6,-20,24,10],
// 4 16 -20 24 10 -16 24 6 -16 24 -6 -20 24 -10
  [4,16,-20,24,10,-16,24,6,-16,24,-6,-20,24,-10],
// 4 16 -20 24 -10 -16 24 -6 16 24 -6 20 24 -10
  [4,16,-20,24,-10,-16,24,-6,16,24,-6,20,24,-10],
// 4 16 20 24 -10 16 24 -6 16 24 6 20 24 10
  [4,16,20,24,-10,16,24,-6,16,24,6,20,24,10],
// 1 16 0 24 0 20 0 0 0 -24 0 0 0 10 box4t.dat
  [1,16,0,24,0,20,0,0,0,-24,0,0,0,10, ldraw_lib__box4t(realsolid)],
// 1 16 10 0 0 1 0 0 0 1 0 0 0 1 stud.dat
  [1,16,10,0,0,1,0,0,0,1,0,0,0,1, ldraw_lib__stud(realsolid)],
// 1 16 -10 0 0 1 0 0 0 1 0 0 0 1 stud.dat
  [1,16,-10,0,0,1,0,0,0,1,0,0,0,1, ldraw_lib__stud(realsolid)],
// 0
];
module ldraw_lib__s__3004s01(step=0, col=false, unit=2/5, alt=false, line=0.2, solid=!$preview)
    makepoly(ldraw_lib__s__3004s01(solid), step=step, col=col, unit=unit, alt=alt, line=line, solid=solid);
ldraw_lib__s__3004s01(line=0.2);
// file: s/3005s01.scad
use <../../lib.scad>
use <../../p/box4t.scad>
use <../../p/box5.scad>
use <../../p/stud.scad>
$fa=1; $fs=0.2;
function ldraw_lib__s__3005s01(realsolid=false) = [
// 0 ~Brick  1 x  1 without Front Face
// 0 Name: s\3005s01.dat
// 0 Author: John Riley [jriley]
// 0 !LDRAW_ORG Subpart UPDATE 2004-01
// 0 !LICENSE Licensed under CC BY 2.0 and CC BY 4.0 : see CAreadme.txt
// 
// 0 BFC CERTIFY CCW
  [0,"BFC","CERTIFY"],
  [0,"BFC","CCW"],
// 
// 0 !HISTORY 2003-09-07 [jriley] BFCed & Subfiled
// 0 !HISTORY 2004-03-02 [PTadmin] Official Update 2004-01
// 0 !HISTORY 2007-08-29 [PTadmin] Header formatted for Contributor Agreement
// 0 !HISTORY 2008-07-01 [PTadmin] Official Update 2008-01
// 
// 
// 0 BFC INVERTNEXT
  [0,"BFC","INVERTNEXT"],
// 1 16 0 24 0 0 0 6 0 -20 0 -6 0 0 box5.dat
  [1,16,0,24,0,0,0,6,0,-20,0,-6,0,0, ldraw_lib__box5(realsolid)],
// 4 16 10 24 -10 6 24 -6 6 24 6 10 24 10
  [4,16,10,24,-10,6,24,-6,6,24,6,10,24,10],
// 4 16 10 24 10 6 24 6 -6 24 6 -10 24 10
  [4,16,10,24,10,6,24,6,-6,24,6,-10,24,10],
// 4 16 -10 24 10 -6 24 6 -6 24 -6 -10 24 -10
  [4,16,-10,24,10,-6,24,6,-6,24,-6,-10,24,-10],
// 4 16 -10 24 -10 -6 24 -6 6 24 -6 10 24 -10
  [4,16,-10,24,-10,-6,24,-6,6,24,-6,10,24,-10],
// 1 16 0 24 0 10 0 0 0 -24 0 0 0 10 box4t.dat
  [1,16,0,24,0,10,0,0,0,-24,0,0,0,10, ldraw_lib__box4t(realsolid)],
// 1 16 0 0 0 0 0 1 0 1 0 -1 0 0 stud.dat
  [1,16,0,0,0,0,0,1,0,1,0,-1,0,0, ldraw_lib__stud(realsolid)],
// 0
];
module ldraw_lib__s__3005s01(step=0, col=false, unit=2/5, alt=false, line=0.2, solid=!$preview)
    makepoly(ldraw_lib__s__3005s01(solid), step=step, col=col, unit=unit, alt=alt, line=line, solid=solid);
ldraw_lib__s__3005s01(line=0.2);
// file: 3004.scad
use <../lib.scad>
use <s/3004s01.scad>
$fa=1; $fs=0.2;
function ldraw_lib__3004(realsolid=false) = [
// 0 Brick  1 x  2
// 0 Name: 3004.dat
// 0 Author: James Jessiman
// 0 !LDRAW_ORG Part UPDATE 2022-05
// 0 !LICENSE Licensed under CC BY 2.0 and CC BY 4.0 : see CAreadme.txt
// 
// 0 BFC CERTIFY CCW
  [0,"BFC","CERTIFY"],
  [0,"BFC","CCW"],
// 
// 0 !HISTORY 2001-10-26 [PTadmin] Official Update 2001-01
// 0 !HISTORY 2002-05-07 {unknown} BFC Certification
// 0 !HISTORY 2002-06-11 [PTadmin] Official Update 2002-03
// 0 !HISTORY 2007-05-07 [PTadmin] Header formatted for Contributor Agreement
// 0 !HISTORY 2008-07-01 [PTadmin] Official Update 2008-01
// 0 !HISTORY 2022-08-04 [MagFors] Using subfile
// 0 !HISTORY 2022-09-15 [PTadmin] Official Update 2022-05
// 
// 
// 1 16 0 0 0 1 0 0 0 1 0 0 0 1 s\3004s01.dat
  [1,16,0,0,0,1,0,0,0,1,0,0,0,1, ldraw_lib__s__3004s01(realsolid)],
// 4 16 -20 24 -10 20 24 -10 20 0 -10 -20 0 -10
  [4,16,-20,24,-10,20,24,-10,20,0,-10,-20,0,-10],
];
module ldraw_lib__3004(step=0, col=false, unit=2/5, alt=false, line=0.2, solid=!$preview)
    makepoly(ldraw_lib__3004(solid), step=step, col=col, unit=unit, alt=alt, line=line, solid=solid);
ldraw_lib__3004(line=0.2);
// file: 3005pua.scad
use <../lib.scad>
use <s/3005s01.scad>
$fa=1; $fs=0.2;
function ldraw_lib__3005pua(realsolid=false) = [
// 0 Brick  1 x  1 with Blue "Æ" (AE Diphthong) Pattern
// 0 Name: 3005pua.dat
// 0 Author: Tore Eriksson [Tore_Eriksson]
// 0 !LDRAW_ORG Part UPDATE 2011-01
// 0 !LICENSE Licensed under CC BY 2.0 and CC BY 4.0 : see CAreadme.txt
// 
// 0 BFC CERTIFY CW
  [0,"BFC","CERTIFY"],
  [0,"BFC","CW"],
// 
// 0 !KEYWORDS æ, Ligature
// 
// 0 !HISTORY 2003-12-09 [Steffen] made use of existing subfile
// 0 !HISTORY 2004-09-15 [PTadmin] Official Update 2004-03
// 0 !HISTORY 2007-05-11 [PTadmin] Header formatted for Contributor Agreement
// 0 !HISTORY 2008-07-01 [PTadmin] Official Update 2008-01
// 0 !HISTORY 2011-01-29 [Steffen] changed file encoding to UTF-8 without BOM, BFCed
// 0 !HISTORY 2011-07-25 [PTadmin] Official Update 2011-01
// 
// 
// 1 16 0 0 0 1 0 0 0 1 0 0 0 1 s\3005s01.dat
  [1,16,0,0,0,1,0,0,0,1,0,0,0,1, ldraw_lib__s__3005s01(realsolid)],
// 4 1 6.85 8.75 -10 1.25 8.75 -10 -1.75 7.5 -10 6.85 7.5 -10
  [4,1,6.85,8.75,-10,1.25,8.75,-10,-1.75,7.5,-10,6.85,7.5,-10],
// 4 1 1.25 16.75 -10 6.85 16.75 -10 6.85 18 -10 0 18 -10
  [4,1,1.25,16.75,-10,6.85,16.75,-10,6.85,18,-10,0,18,-10],
// 4 1 1.25 11.375 -10 3.25 11.375 -10 3.25 12.625 -10 1.25 12.625 -10
  [4,1,1.25,11.375,-10,3.25,11.375,-10,3.25,12.625,-10,1.25,12.625,-10],
// 3 1 1.25 8.75 -10 1.25 16.75 -10 0 18 -10
  [3,1,1.25,8.75,-10,1.25,16.75,-10,0,18,-10],
// 4 1 -1.75 7.5 -10 1.25 8.75 -10 0 9.75 -10 -1.25 9.75 -10
  [4,1,-1.75,7.5,-10,1.25,8.75,-10,0,9.75,-10,-1.25,9.75,-10],
// 4 1 -1.75 7.5 -10 -1.25 9.75 -10 -3 14.3 -10 -6.15 18 -10
  [4,1,-1.75,7.5,-10,-1.25,9.75,-10,-3,14.3,-10,-6.15,18,-10],
// 4 1 -3 14.3 -10 -3.5 15.75 -10 -4.5 18 -10 -6.15 18 -10
  [4,1,-3,14.3,-10,-3.5,15.75,-10,-4.5,18,-10,-6.15,18,-10],
// 4 1 -3 14.3 -10 0 14.3 -10 0 15.75 -10 -3.5 15.75 -10
  [4,1,-3,14.3,-10,0,14.3,-10,0,15.75,-10,-3.5,15.75,-10],
// 3 1 0 9.75 -10 1.25 8.75 -10 0 18 -10
  [3,1,0,9.75,-10,1.25,8.75,-10,0,18,-10],
// 4 16 10 0 -10 6.85 7.5 -10 -1.75 7.5 -10 -10 0 -10
  [4,16,10,0,-10,6.85,7.5,-10,-1.75,7.5,-10,-10,0,-10],
// 3 16 -10 0 -10 -1.75 7.5 -10 -6.15 18 -10
  [3,16,-10,0,-10,-1.75,7.5,-10,-6.15,18,-10],
// 3 16 -10 0 -10 -6.15 18 -10 -10 24 -10
  [3,16,-10,0,-10,-6.15,18,-10,-10,24,-10],
// 4 16 -10 24 -10 -6.15 18 -10 6.85 18 -10 10 24 -10
  [4,16,-10,24,-10,-6.15,18,-10,6.85,18,-10,10,24,-10],
// 4 16 10 24 -10 6.85 18 -10 6.85 7.5 -10 10 0 -10
  [4,16,10,24,-10,6.85,18,-10,6.85,7.5,-10,10,0,-10],
// 4 16 -4.5 18 -10 -3.5 15.75 -10 0 15.75 -10 0 18 -10
  [4,16,-4.5,18,-10,-3.5,15.75,-10,0,15.75,-10,0,18,-10],
// 4 16 6.85 16.75 -10 1.25 16.75 -10 1.25 12.625 -10 3.25 12.625 -10
  [4,16,6.85,16.75,-10,1.25,16.75,-10,1.25,12.625,-10,3.25,12.625,-10],
// 4 16 6.85 16.75 -10 3.25 12.625 -10 3.25 11.375 -10 6.85 8.75 -10
  [4,16,6.85,16.75,-10,3.25,12.625,-10,3.25,11.375,-10,6.85,8.75,-10],
// 4 16 3.25 11.375 -10 1.25 11.375 -10 1.25 8.75 -10 6.85 8.75 -10
  [4,16,3.25,11.375,-10,1.25,11.375,-10,1.25,8.75,-10,6.85,8.75,-10],
// 4 16 -3 14.3 -10 -1.25 9.75 -10 0 9.75 -10 0 14.3 -10
  [4,16,-3,14.3,-10,-1.25,9.75,-10,0,9.75,-10,0,14.3,-10],
];
module ldraw_lib__3005pua(step=0, col=false, unit=2/5, alt=false, line=0.2, solid=!$preview)
    makepoly(ldraw_lib__3005pua(solid), step=step, col=col, unit=unit, alt=alt, line=line, solid=solid);
ldraw_lib__3005pua(line=0.2);
// main file
use <../lib.scad>
use <3005pua.scad>
$fa=1; $fs=0.2;
function ldraw_lib__3005_ae(realsolid=false) = [
// 0 ~Moved to 3005pua
// 0 Name: 3005-ae.dat
// 0 Author: [PTadmin]
// 0 !LDRAW_ORG Part UPDATE 2004-03
// 0 !LICENSE Licensed under CC BY 4.0 : see CAreadme.txt
// 
// 0 BFC CERTIFY CCW
  [0,"BFC","CERTIFY"],
  [0,"BFC","CCW"],
// 
// 0 !HISTORY 1999-02-01 [PTadmin] Official Update 1999-01
// 0 !HISTORY 1999-05-17 [PTadmin] Official Update 1999-03
// 0 !HISTORY 2004-09-15 [PTadmin] Official Update 2004-03
// 0 !HISTORY 2007-05-11 [PTadmin] Header formatted for Contributor Agreement
// 0 !HISTORY 2008-07-01 [PTadmin] Official Update 2008-01
// 
// 
// 1 16 0 0 0 1 0 0 0 1 0 0 0 1 3005pua.dat
  [1,16,0,0,0,1,0,0,0,1,0,0,0,1, ldraw_lib__3005pua(realsolid)],
];
module ldraw_lib__3005_ae(step=0, col=false, unit=2/5, alt=false, line=0.2, solid=!$preview)
    makepoly(ldraw_lib__3005_ae(solid), step=step, col=col, unit=unit, alt=alt, line=line, solid=solid);
ldraw_lib__3005_ae(line=0.2);
